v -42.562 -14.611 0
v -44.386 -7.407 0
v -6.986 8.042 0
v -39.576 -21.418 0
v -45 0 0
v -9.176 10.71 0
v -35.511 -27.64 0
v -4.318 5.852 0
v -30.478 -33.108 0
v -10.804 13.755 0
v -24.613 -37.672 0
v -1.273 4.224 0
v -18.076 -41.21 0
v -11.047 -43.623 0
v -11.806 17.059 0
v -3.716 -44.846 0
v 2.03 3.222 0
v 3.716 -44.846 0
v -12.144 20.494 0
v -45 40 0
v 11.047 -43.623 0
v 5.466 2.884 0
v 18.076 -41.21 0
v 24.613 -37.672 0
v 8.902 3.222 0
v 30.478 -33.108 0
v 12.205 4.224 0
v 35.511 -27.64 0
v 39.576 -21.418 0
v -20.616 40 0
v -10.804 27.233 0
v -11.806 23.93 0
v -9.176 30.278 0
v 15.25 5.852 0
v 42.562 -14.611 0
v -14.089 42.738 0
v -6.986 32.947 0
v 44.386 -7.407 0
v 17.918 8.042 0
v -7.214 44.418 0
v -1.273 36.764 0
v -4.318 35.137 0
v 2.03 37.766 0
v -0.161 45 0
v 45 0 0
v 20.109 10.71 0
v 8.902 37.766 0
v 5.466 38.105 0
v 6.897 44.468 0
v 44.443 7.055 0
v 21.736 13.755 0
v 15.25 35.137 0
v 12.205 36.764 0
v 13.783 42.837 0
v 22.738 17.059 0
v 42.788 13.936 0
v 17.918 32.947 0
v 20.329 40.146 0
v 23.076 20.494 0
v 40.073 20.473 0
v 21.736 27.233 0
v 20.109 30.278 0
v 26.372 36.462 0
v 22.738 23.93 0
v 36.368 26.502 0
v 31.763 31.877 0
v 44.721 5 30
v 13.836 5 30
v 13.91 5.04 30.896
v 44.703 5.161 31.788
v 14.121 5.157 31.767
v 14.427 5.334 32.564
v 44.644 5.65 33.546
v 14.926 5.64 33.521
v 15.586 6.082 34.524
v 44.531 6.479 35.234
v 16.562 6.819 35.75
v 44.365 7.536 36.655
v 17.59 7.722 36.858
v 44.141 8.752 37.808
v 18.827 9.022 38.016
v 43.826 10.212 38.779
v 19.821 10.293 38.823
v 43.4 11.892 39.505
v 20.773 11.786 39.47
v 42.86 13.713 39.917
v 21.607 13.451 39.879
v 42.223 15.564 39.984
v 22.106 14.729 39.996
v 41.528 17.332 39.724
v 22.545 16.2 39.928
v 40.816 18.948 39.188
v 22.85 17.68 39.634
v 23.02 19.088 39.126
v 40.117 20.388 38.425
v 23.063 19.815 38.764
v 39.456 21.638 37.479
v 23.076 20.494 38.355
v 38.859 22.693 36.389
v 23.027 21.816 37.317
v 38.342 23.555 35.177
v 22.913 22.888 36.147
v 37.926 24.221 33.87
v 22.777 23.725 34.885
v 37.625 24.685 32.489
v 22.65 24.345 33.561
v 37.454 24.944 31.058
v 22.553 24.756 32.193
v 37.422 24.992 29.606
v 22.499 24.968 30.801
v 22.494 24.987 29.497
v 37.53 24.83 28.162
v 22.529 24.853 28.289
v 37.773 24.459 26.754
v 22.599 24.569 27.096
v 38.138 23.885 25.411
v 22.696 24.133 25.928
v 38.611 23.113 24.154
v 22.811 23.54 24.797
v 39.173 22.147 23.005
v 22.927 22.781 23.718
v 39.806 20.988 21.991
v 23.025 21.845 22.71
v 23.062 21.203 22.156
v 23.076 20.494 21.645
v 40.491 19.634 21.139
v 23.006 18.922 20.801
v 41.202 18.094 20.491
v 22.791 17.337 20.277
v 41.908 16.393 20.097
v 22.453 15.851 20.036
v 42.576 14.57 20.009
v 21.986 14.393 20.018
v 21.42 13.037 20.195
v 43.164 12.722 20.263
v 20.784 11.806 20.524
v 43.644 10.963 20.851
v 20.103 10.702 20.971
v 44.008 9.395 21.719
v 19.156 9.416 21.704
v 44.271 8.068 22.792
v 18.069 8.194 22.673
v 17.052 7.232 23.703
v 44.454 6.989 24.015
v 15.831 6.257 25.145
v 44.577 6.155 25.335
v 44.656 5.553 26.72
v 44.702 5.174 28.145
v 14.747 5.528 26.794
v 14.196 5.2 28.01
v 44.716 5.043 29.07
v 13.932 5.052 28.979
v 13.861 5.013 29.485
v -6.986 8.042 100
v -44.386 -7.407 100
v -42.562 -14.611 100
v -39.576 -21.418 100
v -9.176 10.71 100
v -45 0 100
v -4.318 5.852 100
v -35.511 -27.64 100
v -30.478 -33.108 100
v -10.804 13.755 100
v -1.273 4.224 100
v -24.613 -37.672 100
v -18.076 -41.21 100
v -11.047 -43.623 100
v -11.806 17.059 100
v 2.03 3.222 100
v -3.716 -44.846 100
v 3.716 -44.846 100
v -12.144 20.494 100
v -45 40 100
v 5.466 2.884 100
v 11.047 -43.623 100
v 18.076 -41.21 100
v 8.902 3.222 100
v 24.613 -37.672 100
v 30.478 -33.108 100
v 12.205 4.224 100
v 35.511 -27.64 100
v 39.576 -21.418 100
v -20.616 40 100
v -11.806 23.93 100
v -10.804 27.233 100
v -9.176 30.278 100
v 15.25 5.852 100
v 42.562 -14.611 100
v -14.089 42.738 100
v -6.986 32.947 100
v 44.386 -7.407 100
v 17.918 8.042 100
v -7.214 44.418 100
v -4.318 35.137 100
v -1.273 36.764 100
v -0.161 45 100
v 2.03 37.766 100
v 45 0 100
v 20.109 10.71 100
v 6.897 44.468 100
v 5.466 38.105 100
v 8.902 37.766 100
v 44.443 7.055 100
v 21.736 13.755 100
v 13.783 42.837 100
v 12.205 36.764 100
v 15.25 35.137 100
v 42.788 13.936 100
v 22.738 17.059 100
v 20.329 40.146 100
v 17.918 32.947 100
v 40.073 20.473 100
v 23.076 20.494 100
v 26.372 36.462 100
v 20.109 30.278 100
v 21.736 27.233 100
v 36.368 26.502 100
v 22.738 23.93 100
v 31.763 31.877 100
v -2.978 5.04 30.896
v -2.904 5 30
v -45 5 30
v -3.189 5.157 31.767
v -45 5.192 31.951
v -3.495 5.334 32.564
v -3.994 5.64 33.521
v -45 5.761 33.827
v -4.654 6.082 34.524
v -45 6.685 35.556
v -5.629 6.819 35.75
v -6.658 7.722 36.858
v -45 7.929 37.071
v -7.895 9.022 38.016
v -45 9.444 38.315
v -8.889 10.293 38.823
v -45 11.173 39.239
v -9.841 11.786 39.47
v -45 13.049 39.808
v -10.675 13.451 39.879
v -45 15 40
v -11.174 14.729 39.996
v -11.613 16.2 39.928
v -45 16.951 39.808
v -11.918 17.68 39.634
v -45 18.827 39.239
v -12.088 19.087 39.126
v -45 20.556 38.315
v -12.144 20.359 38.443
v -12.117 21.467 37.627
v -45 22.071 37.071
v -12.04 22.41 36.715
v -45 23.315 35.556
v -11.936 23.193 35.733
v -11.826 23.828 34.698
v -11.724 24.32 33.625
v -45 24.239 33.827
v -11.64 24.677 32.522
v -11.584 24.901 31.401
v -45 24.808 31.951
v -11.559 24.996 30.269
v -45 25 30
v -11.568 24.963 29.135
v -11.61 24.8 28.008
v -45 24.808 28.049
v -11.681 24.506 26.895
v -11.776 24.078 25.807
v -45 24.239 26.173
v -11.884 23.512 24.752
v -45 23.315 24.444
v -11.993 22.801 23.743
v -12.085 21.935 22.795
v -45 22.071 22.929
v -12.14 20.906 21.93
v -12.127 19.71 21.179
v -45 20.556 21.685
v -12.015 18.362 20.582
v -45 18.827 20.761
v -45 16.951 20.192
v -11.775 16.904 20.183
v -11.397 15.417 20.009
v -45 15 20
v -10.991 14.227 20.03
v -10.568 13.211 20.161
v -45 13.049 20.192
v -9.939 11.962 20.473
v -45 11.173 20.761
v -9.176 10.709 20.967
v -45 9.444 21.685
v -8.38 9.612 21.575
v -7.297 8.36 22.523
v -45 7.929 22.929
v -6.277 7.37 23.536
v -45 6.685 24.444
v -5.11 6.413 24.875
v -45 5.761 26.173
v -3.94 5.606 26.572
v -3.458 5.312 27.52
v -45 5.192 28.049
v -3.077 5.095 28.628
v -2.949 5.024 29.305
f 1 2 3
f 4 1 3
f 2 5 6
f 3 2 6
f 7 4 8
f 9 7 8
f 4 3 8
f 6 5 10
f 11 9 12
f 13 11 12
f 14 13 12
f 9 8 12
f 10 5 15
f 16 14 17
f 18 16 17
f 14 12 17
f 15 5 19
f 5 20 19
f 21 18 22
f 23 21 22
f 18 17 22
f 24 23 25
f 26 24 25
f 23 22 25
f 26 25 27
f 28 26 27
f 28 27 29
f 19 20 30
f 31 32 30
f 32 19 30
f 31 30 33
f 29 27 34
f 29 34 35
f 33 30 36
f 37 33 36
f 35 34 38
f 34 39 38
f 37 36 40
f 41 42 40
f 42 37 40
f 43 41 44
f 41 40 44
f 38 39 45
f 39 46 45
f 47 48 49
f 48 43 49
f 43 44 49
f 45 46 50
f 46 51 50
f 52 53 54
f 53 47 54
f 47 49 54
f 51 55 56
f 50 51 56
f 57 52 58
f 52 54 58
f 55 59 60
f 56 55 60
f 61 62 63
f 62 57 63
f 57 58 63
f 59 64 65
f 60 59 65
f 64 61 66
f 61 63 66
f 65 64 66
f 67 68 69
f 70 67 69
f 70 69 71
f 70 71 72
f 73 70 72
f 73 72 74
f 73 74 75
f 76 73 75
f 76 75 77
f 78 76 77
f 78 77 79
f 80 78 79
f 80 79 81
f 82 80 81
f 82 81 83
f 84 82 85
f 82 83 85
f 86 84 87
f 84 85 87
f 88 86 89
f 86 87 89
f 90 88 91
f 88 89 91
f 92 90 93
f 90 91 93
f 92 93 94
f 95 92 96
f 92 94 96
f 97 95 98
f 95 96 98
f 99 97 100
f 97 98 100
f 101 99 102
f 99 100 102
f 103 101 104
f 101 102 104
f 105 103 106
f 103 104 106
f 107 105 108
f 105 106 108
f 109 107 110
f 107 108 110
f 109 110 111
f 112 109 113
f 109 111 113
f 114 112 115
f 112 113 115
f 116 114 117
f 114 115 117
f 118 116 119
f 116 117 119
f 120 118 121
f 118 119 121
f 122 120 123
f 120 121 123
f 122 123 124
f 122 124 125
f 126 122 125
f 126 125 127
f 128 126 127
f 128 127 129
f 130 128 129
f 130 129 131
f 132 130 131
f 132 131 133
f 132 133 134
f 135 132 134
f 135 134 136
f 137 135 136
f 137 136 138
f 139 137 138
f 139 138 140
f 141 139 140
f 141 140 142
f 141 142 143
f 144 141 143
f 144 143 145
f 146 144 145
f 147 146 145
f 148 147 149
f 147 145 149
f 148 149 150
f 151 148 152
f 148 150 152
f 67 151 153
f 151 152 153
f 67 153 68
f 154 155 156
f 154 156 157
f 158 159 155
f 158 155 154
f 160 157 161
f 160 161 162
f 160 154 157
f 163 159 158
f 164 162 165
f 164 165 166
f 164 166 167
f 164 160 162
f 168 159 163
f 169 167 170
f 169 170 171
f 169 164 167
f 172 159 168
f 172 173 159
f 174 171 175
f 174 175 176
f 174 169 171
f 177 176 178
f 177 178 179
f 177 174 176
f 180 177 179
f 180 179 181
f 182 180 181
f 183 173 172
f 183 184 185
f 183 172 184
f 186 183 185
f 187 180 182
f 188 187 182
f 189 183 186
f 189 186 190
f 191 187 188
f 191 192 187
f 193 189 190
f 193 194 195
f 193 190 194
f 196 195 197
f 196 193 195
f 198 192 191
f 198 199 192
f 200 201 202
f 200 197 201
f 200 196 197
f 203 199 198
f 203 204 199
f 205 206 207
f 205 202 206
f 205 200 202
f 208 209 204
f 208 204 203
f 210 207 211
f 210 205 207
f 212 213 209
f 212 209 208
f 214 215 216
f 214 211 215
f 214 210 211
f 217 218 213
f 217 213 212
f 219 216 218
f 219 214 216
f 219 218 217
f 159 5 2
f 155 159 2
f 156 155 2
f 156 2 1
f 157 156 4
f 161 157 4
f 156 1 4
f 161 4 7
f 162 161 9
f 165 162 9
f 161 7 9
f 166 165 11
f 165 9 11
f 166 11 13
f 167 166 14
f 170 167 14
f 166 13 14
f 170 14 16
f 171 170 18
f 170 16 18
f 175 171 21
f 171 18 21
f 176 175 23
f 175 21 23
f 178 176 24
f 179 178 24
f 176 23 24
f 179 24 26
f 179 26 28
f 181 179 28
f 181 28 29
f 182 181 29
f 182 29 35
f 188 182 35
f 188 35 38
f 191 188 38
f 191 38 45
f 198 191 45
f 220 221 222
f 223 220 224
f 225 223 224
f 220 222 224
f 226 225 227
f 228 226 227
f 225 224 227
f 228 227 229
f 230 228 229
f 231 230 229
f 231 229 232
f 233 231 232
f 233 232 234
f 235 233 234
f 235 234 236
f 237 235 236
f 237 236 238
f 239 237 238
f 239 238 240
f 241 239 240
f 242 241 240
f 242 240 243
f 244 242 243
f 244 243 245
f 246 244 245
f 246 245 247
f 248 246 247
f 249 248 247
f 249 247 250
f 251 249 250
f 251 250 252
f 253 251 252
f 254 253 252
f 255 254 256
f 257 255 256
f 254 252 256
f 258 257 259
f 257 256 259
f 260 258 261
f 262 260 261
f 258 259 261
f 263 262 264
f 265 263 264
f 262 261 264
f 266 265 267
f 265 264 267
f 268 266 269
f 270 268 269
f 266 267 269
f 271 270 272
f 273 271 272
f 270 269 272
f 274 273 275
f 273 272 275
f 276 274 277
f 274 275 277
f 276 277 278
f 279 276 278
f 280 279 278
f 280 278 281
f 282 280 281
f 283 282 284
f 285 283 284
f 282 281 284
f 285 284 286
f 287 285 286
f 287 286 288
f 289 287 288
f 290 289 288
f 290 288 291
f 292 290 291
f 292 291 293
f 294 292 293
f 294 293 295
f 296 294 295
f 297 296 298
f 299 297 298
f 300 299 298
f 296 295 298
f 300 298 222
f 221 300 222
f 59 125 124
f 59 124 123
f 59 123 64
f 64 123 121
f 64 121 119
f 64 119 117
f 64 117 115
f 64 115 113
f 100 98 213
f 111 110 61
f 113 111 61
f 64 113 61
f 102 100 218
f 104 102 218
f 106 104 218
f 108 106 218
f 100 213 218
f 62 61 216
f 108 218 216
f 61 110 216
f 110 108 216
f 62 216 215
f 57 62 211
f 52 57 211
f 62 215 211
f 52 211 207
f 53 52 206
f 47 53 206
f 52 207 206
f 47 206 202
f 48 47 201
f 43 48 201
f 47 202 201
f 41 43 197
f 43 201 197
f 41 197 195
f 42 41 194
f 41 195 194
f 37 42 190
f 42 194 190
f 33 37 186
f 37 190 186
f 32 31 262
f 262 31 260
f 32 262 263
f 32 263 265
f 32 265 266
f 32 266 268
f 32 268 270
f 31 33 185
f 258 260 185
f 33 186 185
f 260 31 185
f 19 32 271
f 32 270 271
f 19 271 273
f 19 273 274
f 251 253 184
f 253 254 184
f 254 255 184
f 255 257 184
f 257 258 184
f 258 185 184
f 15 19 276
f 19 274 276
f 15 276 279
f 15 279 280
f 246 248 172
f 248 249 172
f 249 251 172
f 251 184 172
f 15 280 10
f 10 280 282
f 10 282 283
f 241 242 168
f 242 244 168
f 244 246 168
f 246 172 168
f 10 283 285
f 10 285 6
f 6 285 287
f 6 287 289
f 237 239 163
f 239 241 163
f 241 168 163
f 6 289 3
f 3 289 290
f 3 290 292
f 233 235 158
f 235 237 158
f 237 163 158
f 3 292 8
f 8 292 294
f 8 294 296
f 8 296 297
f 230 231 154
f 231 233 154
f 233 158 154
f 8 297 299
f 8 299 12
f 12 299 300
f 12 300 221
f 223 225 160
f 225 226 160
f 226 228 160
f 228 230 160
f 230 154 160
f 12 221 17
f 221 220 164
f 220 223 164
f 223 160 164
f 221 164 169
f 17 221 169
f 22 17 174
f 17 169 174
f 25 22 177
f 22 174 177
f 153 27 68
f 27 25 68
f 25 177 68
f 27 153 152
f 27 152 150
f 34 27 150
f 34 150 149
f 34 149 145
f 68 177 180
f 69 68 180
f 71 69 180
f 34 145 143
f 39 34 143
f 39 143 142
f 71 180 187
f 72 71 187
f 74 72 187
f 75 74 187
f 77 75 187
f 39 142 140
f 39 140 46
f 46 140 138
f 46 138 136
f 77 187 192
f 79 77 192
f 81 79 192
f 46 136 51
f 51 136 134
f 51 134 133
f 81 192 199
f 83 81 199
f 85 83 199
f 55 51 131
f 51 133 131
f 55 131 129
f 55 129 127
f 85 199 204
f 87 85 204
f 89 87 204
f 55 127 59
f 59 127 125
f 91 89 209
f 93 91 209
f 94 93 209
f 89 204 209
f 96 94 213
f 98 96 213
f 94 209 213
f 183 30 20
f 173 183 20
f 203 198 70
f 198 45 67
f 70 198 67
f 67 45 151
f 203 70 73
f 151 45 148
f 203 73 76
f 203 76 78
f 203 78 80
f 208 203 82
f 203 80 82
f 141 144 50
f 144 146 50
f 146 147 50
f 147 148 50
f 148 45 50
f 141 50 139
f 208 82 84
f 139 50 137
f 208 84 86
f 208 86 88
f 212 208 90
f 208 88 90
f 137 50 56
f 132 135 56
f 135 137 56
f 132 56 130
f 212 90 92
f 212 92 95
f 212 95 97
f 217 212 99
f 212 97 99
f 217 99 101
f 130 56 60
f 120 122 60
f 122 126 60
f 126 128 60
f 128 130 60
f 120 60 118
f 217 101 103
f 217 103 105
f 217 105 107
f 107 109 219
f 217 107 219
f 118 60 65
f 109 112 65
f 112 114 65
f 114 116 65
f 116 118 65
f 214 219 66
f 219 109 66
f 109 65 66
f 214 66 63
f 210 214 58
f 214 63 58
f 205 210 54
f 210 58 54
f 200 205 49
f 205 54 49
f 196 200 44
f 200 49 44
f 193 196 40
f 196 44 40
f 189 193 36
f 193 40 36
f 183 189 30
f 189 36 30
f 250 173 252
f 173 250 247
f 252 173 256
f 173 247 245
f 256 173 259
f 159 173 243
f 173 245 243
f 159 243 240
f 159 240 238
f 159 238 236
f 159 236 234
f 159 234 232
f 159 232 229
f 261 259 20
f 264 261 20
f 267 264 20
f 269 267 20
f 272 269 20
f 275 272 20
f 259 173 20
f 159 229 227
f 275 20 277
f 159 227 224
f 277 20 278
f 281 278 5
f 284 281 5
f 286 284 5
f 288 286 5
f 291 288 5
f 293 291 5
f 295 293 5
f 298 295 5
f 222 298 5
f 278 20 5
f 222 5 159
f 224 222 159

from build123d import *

# Parameters (mm, degrees)
F1_DEPTH = 100
F2_R     = 17.6104125338
F3_DEPTH = 100.001
F4_R     = 10
F5_DEPTH = 90.001


with BuildPart() as f1:
    # F0 (on Top) → F1 (new body)
    with BuildSketch(Plane.XY):
        with BuildLine():
            Line((0, 0), (-45, 0))
            ThreePointArc((-45, 0), (0, -45), (45, 0))
            ThreePointArc((45, 0), (23.4232921921, 38.4232921921), (-20.6155281281, 40))
            Line((-20.6155281281, 40), (0, 40))
            Line((0, 40), (0, 0))
        make_face()
        with BuildLine():
            Line((-45, 40), (-45, 0))
            ThreePointArc((-45, 0), (-38.4232921921, 23.4232921921), (-20.6155281281, 40))
            Line((-20.6155281281, 40), (-45, 40))
        make_face()
        with BuildLine():
            ThreePointArc((-20.6155281281, 40), (-38.4232921921, 23.4232921921), (-45, 0))
            Line((-45, 0), (0, 0))
            Line((0, 0), (0, 40))
            Line((0, 40), (-20.6155281281, 40))
        make_face()
    extrude(amount=F1_DEPTH)

    # F2 (on face) → F3 (cut, through all)
    with BuildSketch(Plane.XY.offset(100)):
        with Locations((5.4660397582, 20.4941760749)):
            Circle(F2_R)
    extrude(amount=-F3_DEPTH, mode=Mode.SUBTRACT)

    # F4 (on face) → F5 (cut, through all)
    with BuildSketch(Plane(origin=(-45, 0, 0), x_dir=(0, -1, 0), z_dir=(-1, 0, 0))):
        with Locations((-15, 30)):
            Circle(F4_R)
    extrude(amount=-F5_DEPTH, mode=Mode.SUBTRACT)


solid = f1.part
